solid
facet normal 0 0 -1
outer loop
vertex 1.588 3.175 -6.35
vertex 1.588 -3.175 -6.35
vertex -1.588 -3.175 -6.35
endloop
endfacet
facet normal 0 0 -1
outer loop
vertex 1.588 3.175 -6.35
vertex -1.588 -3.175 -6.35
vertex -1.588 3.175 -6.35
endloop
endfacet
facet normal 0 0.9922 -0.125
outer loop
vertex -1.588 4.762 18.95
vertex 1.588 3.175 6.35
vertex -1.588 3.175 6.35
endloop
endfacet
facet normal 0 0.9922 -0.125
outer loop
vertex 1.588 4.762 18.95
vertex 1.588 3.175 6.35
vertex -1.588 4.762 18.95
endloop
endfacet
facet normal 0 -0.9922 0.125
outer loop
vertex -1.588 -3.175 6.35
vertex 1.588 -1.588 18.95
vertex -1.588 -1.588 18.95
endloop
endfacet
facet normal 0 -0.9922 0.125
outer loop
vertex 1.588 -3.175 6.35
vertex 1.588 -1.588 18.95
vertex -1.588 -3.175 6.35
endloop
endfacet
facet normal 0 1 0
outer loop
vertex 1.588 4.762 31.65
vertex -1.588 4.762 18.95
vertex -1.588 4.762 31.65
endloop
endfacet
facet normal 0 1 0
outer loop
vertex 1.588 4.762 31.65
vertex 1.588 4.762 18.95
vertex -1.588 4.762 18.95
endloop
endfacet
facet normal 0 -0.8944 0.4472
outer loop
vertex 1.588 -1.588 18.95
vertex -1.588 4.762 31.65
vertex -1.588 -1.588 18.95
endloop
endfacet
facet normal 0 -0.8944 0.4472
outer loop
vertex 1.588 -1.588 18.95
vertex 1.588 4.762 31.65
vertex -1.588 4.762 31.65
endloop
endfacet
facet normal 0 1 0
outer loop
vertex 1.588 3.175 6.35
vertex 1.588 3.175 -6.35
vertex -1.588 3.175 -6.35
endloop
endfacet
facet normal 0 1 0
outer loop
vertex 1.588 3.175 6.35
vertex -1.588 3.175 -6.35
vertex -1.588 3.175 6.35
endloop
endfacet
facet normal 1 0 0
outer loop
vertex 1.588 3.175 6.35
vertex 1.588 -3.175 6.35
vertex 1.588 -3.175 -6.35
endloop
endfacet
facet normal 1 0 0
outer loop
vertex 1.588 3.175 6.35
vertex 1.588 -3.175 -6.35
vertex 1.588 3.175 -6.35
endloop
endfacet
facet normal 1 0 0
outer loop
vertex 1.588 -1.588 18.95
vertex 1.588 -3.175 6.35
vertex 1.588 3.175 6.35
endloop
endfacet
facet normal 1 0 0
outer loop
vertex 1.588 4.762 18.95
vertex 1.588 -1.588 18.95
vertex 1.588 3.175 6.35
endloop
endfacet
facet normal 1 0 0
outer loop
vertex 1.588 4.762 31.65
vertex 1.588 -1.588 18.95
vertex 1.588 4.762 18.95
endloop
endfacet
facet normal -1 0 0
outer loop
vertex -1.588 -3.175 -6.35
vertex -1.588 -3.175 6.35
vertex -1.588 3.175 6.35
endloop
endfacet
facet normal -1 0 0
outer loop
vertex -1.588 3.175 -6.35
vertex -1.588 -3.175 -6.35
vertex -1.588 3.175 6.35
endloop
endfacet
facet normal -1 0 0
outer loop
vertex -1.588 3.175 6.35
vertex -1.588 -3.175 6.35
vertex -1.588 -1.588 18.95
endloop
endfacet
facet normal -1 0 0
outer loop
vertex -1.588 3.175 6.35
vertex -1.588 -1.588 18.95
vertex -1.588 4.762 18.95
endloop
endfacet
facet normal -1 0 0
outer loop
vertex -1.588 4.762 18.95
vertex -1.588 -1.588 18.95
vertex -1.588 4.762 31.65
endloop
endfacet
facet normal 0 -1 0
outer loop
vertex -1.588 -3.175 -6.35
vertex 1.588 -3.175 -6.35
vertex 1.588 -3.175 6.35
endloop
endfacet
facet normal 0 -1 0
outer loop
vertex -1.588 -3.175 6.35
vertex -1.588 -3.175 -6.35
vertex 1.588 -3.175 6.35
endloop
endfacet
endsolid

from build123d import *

# Parameters (mm, degrees)
F0_W     = 6.35
F0_H     = 12.7
F1_DEPTH = 1.5875


with BuildPart() as f1:
    # F0 (on Right) → F1 (new body, symmetric)
    with BuildSketch(Plane.YZ):
        Polygon((-1.5875, 18.950391), (-3.175, 6.35), (3.175, 6.35), (4.7625, 18.950391), (4.7625, 31.650391), align=None)
        Rectangle(F0_W, F0_H)
    extrude(amount=F1_DEPTH, both=True)


solid = f1.part
